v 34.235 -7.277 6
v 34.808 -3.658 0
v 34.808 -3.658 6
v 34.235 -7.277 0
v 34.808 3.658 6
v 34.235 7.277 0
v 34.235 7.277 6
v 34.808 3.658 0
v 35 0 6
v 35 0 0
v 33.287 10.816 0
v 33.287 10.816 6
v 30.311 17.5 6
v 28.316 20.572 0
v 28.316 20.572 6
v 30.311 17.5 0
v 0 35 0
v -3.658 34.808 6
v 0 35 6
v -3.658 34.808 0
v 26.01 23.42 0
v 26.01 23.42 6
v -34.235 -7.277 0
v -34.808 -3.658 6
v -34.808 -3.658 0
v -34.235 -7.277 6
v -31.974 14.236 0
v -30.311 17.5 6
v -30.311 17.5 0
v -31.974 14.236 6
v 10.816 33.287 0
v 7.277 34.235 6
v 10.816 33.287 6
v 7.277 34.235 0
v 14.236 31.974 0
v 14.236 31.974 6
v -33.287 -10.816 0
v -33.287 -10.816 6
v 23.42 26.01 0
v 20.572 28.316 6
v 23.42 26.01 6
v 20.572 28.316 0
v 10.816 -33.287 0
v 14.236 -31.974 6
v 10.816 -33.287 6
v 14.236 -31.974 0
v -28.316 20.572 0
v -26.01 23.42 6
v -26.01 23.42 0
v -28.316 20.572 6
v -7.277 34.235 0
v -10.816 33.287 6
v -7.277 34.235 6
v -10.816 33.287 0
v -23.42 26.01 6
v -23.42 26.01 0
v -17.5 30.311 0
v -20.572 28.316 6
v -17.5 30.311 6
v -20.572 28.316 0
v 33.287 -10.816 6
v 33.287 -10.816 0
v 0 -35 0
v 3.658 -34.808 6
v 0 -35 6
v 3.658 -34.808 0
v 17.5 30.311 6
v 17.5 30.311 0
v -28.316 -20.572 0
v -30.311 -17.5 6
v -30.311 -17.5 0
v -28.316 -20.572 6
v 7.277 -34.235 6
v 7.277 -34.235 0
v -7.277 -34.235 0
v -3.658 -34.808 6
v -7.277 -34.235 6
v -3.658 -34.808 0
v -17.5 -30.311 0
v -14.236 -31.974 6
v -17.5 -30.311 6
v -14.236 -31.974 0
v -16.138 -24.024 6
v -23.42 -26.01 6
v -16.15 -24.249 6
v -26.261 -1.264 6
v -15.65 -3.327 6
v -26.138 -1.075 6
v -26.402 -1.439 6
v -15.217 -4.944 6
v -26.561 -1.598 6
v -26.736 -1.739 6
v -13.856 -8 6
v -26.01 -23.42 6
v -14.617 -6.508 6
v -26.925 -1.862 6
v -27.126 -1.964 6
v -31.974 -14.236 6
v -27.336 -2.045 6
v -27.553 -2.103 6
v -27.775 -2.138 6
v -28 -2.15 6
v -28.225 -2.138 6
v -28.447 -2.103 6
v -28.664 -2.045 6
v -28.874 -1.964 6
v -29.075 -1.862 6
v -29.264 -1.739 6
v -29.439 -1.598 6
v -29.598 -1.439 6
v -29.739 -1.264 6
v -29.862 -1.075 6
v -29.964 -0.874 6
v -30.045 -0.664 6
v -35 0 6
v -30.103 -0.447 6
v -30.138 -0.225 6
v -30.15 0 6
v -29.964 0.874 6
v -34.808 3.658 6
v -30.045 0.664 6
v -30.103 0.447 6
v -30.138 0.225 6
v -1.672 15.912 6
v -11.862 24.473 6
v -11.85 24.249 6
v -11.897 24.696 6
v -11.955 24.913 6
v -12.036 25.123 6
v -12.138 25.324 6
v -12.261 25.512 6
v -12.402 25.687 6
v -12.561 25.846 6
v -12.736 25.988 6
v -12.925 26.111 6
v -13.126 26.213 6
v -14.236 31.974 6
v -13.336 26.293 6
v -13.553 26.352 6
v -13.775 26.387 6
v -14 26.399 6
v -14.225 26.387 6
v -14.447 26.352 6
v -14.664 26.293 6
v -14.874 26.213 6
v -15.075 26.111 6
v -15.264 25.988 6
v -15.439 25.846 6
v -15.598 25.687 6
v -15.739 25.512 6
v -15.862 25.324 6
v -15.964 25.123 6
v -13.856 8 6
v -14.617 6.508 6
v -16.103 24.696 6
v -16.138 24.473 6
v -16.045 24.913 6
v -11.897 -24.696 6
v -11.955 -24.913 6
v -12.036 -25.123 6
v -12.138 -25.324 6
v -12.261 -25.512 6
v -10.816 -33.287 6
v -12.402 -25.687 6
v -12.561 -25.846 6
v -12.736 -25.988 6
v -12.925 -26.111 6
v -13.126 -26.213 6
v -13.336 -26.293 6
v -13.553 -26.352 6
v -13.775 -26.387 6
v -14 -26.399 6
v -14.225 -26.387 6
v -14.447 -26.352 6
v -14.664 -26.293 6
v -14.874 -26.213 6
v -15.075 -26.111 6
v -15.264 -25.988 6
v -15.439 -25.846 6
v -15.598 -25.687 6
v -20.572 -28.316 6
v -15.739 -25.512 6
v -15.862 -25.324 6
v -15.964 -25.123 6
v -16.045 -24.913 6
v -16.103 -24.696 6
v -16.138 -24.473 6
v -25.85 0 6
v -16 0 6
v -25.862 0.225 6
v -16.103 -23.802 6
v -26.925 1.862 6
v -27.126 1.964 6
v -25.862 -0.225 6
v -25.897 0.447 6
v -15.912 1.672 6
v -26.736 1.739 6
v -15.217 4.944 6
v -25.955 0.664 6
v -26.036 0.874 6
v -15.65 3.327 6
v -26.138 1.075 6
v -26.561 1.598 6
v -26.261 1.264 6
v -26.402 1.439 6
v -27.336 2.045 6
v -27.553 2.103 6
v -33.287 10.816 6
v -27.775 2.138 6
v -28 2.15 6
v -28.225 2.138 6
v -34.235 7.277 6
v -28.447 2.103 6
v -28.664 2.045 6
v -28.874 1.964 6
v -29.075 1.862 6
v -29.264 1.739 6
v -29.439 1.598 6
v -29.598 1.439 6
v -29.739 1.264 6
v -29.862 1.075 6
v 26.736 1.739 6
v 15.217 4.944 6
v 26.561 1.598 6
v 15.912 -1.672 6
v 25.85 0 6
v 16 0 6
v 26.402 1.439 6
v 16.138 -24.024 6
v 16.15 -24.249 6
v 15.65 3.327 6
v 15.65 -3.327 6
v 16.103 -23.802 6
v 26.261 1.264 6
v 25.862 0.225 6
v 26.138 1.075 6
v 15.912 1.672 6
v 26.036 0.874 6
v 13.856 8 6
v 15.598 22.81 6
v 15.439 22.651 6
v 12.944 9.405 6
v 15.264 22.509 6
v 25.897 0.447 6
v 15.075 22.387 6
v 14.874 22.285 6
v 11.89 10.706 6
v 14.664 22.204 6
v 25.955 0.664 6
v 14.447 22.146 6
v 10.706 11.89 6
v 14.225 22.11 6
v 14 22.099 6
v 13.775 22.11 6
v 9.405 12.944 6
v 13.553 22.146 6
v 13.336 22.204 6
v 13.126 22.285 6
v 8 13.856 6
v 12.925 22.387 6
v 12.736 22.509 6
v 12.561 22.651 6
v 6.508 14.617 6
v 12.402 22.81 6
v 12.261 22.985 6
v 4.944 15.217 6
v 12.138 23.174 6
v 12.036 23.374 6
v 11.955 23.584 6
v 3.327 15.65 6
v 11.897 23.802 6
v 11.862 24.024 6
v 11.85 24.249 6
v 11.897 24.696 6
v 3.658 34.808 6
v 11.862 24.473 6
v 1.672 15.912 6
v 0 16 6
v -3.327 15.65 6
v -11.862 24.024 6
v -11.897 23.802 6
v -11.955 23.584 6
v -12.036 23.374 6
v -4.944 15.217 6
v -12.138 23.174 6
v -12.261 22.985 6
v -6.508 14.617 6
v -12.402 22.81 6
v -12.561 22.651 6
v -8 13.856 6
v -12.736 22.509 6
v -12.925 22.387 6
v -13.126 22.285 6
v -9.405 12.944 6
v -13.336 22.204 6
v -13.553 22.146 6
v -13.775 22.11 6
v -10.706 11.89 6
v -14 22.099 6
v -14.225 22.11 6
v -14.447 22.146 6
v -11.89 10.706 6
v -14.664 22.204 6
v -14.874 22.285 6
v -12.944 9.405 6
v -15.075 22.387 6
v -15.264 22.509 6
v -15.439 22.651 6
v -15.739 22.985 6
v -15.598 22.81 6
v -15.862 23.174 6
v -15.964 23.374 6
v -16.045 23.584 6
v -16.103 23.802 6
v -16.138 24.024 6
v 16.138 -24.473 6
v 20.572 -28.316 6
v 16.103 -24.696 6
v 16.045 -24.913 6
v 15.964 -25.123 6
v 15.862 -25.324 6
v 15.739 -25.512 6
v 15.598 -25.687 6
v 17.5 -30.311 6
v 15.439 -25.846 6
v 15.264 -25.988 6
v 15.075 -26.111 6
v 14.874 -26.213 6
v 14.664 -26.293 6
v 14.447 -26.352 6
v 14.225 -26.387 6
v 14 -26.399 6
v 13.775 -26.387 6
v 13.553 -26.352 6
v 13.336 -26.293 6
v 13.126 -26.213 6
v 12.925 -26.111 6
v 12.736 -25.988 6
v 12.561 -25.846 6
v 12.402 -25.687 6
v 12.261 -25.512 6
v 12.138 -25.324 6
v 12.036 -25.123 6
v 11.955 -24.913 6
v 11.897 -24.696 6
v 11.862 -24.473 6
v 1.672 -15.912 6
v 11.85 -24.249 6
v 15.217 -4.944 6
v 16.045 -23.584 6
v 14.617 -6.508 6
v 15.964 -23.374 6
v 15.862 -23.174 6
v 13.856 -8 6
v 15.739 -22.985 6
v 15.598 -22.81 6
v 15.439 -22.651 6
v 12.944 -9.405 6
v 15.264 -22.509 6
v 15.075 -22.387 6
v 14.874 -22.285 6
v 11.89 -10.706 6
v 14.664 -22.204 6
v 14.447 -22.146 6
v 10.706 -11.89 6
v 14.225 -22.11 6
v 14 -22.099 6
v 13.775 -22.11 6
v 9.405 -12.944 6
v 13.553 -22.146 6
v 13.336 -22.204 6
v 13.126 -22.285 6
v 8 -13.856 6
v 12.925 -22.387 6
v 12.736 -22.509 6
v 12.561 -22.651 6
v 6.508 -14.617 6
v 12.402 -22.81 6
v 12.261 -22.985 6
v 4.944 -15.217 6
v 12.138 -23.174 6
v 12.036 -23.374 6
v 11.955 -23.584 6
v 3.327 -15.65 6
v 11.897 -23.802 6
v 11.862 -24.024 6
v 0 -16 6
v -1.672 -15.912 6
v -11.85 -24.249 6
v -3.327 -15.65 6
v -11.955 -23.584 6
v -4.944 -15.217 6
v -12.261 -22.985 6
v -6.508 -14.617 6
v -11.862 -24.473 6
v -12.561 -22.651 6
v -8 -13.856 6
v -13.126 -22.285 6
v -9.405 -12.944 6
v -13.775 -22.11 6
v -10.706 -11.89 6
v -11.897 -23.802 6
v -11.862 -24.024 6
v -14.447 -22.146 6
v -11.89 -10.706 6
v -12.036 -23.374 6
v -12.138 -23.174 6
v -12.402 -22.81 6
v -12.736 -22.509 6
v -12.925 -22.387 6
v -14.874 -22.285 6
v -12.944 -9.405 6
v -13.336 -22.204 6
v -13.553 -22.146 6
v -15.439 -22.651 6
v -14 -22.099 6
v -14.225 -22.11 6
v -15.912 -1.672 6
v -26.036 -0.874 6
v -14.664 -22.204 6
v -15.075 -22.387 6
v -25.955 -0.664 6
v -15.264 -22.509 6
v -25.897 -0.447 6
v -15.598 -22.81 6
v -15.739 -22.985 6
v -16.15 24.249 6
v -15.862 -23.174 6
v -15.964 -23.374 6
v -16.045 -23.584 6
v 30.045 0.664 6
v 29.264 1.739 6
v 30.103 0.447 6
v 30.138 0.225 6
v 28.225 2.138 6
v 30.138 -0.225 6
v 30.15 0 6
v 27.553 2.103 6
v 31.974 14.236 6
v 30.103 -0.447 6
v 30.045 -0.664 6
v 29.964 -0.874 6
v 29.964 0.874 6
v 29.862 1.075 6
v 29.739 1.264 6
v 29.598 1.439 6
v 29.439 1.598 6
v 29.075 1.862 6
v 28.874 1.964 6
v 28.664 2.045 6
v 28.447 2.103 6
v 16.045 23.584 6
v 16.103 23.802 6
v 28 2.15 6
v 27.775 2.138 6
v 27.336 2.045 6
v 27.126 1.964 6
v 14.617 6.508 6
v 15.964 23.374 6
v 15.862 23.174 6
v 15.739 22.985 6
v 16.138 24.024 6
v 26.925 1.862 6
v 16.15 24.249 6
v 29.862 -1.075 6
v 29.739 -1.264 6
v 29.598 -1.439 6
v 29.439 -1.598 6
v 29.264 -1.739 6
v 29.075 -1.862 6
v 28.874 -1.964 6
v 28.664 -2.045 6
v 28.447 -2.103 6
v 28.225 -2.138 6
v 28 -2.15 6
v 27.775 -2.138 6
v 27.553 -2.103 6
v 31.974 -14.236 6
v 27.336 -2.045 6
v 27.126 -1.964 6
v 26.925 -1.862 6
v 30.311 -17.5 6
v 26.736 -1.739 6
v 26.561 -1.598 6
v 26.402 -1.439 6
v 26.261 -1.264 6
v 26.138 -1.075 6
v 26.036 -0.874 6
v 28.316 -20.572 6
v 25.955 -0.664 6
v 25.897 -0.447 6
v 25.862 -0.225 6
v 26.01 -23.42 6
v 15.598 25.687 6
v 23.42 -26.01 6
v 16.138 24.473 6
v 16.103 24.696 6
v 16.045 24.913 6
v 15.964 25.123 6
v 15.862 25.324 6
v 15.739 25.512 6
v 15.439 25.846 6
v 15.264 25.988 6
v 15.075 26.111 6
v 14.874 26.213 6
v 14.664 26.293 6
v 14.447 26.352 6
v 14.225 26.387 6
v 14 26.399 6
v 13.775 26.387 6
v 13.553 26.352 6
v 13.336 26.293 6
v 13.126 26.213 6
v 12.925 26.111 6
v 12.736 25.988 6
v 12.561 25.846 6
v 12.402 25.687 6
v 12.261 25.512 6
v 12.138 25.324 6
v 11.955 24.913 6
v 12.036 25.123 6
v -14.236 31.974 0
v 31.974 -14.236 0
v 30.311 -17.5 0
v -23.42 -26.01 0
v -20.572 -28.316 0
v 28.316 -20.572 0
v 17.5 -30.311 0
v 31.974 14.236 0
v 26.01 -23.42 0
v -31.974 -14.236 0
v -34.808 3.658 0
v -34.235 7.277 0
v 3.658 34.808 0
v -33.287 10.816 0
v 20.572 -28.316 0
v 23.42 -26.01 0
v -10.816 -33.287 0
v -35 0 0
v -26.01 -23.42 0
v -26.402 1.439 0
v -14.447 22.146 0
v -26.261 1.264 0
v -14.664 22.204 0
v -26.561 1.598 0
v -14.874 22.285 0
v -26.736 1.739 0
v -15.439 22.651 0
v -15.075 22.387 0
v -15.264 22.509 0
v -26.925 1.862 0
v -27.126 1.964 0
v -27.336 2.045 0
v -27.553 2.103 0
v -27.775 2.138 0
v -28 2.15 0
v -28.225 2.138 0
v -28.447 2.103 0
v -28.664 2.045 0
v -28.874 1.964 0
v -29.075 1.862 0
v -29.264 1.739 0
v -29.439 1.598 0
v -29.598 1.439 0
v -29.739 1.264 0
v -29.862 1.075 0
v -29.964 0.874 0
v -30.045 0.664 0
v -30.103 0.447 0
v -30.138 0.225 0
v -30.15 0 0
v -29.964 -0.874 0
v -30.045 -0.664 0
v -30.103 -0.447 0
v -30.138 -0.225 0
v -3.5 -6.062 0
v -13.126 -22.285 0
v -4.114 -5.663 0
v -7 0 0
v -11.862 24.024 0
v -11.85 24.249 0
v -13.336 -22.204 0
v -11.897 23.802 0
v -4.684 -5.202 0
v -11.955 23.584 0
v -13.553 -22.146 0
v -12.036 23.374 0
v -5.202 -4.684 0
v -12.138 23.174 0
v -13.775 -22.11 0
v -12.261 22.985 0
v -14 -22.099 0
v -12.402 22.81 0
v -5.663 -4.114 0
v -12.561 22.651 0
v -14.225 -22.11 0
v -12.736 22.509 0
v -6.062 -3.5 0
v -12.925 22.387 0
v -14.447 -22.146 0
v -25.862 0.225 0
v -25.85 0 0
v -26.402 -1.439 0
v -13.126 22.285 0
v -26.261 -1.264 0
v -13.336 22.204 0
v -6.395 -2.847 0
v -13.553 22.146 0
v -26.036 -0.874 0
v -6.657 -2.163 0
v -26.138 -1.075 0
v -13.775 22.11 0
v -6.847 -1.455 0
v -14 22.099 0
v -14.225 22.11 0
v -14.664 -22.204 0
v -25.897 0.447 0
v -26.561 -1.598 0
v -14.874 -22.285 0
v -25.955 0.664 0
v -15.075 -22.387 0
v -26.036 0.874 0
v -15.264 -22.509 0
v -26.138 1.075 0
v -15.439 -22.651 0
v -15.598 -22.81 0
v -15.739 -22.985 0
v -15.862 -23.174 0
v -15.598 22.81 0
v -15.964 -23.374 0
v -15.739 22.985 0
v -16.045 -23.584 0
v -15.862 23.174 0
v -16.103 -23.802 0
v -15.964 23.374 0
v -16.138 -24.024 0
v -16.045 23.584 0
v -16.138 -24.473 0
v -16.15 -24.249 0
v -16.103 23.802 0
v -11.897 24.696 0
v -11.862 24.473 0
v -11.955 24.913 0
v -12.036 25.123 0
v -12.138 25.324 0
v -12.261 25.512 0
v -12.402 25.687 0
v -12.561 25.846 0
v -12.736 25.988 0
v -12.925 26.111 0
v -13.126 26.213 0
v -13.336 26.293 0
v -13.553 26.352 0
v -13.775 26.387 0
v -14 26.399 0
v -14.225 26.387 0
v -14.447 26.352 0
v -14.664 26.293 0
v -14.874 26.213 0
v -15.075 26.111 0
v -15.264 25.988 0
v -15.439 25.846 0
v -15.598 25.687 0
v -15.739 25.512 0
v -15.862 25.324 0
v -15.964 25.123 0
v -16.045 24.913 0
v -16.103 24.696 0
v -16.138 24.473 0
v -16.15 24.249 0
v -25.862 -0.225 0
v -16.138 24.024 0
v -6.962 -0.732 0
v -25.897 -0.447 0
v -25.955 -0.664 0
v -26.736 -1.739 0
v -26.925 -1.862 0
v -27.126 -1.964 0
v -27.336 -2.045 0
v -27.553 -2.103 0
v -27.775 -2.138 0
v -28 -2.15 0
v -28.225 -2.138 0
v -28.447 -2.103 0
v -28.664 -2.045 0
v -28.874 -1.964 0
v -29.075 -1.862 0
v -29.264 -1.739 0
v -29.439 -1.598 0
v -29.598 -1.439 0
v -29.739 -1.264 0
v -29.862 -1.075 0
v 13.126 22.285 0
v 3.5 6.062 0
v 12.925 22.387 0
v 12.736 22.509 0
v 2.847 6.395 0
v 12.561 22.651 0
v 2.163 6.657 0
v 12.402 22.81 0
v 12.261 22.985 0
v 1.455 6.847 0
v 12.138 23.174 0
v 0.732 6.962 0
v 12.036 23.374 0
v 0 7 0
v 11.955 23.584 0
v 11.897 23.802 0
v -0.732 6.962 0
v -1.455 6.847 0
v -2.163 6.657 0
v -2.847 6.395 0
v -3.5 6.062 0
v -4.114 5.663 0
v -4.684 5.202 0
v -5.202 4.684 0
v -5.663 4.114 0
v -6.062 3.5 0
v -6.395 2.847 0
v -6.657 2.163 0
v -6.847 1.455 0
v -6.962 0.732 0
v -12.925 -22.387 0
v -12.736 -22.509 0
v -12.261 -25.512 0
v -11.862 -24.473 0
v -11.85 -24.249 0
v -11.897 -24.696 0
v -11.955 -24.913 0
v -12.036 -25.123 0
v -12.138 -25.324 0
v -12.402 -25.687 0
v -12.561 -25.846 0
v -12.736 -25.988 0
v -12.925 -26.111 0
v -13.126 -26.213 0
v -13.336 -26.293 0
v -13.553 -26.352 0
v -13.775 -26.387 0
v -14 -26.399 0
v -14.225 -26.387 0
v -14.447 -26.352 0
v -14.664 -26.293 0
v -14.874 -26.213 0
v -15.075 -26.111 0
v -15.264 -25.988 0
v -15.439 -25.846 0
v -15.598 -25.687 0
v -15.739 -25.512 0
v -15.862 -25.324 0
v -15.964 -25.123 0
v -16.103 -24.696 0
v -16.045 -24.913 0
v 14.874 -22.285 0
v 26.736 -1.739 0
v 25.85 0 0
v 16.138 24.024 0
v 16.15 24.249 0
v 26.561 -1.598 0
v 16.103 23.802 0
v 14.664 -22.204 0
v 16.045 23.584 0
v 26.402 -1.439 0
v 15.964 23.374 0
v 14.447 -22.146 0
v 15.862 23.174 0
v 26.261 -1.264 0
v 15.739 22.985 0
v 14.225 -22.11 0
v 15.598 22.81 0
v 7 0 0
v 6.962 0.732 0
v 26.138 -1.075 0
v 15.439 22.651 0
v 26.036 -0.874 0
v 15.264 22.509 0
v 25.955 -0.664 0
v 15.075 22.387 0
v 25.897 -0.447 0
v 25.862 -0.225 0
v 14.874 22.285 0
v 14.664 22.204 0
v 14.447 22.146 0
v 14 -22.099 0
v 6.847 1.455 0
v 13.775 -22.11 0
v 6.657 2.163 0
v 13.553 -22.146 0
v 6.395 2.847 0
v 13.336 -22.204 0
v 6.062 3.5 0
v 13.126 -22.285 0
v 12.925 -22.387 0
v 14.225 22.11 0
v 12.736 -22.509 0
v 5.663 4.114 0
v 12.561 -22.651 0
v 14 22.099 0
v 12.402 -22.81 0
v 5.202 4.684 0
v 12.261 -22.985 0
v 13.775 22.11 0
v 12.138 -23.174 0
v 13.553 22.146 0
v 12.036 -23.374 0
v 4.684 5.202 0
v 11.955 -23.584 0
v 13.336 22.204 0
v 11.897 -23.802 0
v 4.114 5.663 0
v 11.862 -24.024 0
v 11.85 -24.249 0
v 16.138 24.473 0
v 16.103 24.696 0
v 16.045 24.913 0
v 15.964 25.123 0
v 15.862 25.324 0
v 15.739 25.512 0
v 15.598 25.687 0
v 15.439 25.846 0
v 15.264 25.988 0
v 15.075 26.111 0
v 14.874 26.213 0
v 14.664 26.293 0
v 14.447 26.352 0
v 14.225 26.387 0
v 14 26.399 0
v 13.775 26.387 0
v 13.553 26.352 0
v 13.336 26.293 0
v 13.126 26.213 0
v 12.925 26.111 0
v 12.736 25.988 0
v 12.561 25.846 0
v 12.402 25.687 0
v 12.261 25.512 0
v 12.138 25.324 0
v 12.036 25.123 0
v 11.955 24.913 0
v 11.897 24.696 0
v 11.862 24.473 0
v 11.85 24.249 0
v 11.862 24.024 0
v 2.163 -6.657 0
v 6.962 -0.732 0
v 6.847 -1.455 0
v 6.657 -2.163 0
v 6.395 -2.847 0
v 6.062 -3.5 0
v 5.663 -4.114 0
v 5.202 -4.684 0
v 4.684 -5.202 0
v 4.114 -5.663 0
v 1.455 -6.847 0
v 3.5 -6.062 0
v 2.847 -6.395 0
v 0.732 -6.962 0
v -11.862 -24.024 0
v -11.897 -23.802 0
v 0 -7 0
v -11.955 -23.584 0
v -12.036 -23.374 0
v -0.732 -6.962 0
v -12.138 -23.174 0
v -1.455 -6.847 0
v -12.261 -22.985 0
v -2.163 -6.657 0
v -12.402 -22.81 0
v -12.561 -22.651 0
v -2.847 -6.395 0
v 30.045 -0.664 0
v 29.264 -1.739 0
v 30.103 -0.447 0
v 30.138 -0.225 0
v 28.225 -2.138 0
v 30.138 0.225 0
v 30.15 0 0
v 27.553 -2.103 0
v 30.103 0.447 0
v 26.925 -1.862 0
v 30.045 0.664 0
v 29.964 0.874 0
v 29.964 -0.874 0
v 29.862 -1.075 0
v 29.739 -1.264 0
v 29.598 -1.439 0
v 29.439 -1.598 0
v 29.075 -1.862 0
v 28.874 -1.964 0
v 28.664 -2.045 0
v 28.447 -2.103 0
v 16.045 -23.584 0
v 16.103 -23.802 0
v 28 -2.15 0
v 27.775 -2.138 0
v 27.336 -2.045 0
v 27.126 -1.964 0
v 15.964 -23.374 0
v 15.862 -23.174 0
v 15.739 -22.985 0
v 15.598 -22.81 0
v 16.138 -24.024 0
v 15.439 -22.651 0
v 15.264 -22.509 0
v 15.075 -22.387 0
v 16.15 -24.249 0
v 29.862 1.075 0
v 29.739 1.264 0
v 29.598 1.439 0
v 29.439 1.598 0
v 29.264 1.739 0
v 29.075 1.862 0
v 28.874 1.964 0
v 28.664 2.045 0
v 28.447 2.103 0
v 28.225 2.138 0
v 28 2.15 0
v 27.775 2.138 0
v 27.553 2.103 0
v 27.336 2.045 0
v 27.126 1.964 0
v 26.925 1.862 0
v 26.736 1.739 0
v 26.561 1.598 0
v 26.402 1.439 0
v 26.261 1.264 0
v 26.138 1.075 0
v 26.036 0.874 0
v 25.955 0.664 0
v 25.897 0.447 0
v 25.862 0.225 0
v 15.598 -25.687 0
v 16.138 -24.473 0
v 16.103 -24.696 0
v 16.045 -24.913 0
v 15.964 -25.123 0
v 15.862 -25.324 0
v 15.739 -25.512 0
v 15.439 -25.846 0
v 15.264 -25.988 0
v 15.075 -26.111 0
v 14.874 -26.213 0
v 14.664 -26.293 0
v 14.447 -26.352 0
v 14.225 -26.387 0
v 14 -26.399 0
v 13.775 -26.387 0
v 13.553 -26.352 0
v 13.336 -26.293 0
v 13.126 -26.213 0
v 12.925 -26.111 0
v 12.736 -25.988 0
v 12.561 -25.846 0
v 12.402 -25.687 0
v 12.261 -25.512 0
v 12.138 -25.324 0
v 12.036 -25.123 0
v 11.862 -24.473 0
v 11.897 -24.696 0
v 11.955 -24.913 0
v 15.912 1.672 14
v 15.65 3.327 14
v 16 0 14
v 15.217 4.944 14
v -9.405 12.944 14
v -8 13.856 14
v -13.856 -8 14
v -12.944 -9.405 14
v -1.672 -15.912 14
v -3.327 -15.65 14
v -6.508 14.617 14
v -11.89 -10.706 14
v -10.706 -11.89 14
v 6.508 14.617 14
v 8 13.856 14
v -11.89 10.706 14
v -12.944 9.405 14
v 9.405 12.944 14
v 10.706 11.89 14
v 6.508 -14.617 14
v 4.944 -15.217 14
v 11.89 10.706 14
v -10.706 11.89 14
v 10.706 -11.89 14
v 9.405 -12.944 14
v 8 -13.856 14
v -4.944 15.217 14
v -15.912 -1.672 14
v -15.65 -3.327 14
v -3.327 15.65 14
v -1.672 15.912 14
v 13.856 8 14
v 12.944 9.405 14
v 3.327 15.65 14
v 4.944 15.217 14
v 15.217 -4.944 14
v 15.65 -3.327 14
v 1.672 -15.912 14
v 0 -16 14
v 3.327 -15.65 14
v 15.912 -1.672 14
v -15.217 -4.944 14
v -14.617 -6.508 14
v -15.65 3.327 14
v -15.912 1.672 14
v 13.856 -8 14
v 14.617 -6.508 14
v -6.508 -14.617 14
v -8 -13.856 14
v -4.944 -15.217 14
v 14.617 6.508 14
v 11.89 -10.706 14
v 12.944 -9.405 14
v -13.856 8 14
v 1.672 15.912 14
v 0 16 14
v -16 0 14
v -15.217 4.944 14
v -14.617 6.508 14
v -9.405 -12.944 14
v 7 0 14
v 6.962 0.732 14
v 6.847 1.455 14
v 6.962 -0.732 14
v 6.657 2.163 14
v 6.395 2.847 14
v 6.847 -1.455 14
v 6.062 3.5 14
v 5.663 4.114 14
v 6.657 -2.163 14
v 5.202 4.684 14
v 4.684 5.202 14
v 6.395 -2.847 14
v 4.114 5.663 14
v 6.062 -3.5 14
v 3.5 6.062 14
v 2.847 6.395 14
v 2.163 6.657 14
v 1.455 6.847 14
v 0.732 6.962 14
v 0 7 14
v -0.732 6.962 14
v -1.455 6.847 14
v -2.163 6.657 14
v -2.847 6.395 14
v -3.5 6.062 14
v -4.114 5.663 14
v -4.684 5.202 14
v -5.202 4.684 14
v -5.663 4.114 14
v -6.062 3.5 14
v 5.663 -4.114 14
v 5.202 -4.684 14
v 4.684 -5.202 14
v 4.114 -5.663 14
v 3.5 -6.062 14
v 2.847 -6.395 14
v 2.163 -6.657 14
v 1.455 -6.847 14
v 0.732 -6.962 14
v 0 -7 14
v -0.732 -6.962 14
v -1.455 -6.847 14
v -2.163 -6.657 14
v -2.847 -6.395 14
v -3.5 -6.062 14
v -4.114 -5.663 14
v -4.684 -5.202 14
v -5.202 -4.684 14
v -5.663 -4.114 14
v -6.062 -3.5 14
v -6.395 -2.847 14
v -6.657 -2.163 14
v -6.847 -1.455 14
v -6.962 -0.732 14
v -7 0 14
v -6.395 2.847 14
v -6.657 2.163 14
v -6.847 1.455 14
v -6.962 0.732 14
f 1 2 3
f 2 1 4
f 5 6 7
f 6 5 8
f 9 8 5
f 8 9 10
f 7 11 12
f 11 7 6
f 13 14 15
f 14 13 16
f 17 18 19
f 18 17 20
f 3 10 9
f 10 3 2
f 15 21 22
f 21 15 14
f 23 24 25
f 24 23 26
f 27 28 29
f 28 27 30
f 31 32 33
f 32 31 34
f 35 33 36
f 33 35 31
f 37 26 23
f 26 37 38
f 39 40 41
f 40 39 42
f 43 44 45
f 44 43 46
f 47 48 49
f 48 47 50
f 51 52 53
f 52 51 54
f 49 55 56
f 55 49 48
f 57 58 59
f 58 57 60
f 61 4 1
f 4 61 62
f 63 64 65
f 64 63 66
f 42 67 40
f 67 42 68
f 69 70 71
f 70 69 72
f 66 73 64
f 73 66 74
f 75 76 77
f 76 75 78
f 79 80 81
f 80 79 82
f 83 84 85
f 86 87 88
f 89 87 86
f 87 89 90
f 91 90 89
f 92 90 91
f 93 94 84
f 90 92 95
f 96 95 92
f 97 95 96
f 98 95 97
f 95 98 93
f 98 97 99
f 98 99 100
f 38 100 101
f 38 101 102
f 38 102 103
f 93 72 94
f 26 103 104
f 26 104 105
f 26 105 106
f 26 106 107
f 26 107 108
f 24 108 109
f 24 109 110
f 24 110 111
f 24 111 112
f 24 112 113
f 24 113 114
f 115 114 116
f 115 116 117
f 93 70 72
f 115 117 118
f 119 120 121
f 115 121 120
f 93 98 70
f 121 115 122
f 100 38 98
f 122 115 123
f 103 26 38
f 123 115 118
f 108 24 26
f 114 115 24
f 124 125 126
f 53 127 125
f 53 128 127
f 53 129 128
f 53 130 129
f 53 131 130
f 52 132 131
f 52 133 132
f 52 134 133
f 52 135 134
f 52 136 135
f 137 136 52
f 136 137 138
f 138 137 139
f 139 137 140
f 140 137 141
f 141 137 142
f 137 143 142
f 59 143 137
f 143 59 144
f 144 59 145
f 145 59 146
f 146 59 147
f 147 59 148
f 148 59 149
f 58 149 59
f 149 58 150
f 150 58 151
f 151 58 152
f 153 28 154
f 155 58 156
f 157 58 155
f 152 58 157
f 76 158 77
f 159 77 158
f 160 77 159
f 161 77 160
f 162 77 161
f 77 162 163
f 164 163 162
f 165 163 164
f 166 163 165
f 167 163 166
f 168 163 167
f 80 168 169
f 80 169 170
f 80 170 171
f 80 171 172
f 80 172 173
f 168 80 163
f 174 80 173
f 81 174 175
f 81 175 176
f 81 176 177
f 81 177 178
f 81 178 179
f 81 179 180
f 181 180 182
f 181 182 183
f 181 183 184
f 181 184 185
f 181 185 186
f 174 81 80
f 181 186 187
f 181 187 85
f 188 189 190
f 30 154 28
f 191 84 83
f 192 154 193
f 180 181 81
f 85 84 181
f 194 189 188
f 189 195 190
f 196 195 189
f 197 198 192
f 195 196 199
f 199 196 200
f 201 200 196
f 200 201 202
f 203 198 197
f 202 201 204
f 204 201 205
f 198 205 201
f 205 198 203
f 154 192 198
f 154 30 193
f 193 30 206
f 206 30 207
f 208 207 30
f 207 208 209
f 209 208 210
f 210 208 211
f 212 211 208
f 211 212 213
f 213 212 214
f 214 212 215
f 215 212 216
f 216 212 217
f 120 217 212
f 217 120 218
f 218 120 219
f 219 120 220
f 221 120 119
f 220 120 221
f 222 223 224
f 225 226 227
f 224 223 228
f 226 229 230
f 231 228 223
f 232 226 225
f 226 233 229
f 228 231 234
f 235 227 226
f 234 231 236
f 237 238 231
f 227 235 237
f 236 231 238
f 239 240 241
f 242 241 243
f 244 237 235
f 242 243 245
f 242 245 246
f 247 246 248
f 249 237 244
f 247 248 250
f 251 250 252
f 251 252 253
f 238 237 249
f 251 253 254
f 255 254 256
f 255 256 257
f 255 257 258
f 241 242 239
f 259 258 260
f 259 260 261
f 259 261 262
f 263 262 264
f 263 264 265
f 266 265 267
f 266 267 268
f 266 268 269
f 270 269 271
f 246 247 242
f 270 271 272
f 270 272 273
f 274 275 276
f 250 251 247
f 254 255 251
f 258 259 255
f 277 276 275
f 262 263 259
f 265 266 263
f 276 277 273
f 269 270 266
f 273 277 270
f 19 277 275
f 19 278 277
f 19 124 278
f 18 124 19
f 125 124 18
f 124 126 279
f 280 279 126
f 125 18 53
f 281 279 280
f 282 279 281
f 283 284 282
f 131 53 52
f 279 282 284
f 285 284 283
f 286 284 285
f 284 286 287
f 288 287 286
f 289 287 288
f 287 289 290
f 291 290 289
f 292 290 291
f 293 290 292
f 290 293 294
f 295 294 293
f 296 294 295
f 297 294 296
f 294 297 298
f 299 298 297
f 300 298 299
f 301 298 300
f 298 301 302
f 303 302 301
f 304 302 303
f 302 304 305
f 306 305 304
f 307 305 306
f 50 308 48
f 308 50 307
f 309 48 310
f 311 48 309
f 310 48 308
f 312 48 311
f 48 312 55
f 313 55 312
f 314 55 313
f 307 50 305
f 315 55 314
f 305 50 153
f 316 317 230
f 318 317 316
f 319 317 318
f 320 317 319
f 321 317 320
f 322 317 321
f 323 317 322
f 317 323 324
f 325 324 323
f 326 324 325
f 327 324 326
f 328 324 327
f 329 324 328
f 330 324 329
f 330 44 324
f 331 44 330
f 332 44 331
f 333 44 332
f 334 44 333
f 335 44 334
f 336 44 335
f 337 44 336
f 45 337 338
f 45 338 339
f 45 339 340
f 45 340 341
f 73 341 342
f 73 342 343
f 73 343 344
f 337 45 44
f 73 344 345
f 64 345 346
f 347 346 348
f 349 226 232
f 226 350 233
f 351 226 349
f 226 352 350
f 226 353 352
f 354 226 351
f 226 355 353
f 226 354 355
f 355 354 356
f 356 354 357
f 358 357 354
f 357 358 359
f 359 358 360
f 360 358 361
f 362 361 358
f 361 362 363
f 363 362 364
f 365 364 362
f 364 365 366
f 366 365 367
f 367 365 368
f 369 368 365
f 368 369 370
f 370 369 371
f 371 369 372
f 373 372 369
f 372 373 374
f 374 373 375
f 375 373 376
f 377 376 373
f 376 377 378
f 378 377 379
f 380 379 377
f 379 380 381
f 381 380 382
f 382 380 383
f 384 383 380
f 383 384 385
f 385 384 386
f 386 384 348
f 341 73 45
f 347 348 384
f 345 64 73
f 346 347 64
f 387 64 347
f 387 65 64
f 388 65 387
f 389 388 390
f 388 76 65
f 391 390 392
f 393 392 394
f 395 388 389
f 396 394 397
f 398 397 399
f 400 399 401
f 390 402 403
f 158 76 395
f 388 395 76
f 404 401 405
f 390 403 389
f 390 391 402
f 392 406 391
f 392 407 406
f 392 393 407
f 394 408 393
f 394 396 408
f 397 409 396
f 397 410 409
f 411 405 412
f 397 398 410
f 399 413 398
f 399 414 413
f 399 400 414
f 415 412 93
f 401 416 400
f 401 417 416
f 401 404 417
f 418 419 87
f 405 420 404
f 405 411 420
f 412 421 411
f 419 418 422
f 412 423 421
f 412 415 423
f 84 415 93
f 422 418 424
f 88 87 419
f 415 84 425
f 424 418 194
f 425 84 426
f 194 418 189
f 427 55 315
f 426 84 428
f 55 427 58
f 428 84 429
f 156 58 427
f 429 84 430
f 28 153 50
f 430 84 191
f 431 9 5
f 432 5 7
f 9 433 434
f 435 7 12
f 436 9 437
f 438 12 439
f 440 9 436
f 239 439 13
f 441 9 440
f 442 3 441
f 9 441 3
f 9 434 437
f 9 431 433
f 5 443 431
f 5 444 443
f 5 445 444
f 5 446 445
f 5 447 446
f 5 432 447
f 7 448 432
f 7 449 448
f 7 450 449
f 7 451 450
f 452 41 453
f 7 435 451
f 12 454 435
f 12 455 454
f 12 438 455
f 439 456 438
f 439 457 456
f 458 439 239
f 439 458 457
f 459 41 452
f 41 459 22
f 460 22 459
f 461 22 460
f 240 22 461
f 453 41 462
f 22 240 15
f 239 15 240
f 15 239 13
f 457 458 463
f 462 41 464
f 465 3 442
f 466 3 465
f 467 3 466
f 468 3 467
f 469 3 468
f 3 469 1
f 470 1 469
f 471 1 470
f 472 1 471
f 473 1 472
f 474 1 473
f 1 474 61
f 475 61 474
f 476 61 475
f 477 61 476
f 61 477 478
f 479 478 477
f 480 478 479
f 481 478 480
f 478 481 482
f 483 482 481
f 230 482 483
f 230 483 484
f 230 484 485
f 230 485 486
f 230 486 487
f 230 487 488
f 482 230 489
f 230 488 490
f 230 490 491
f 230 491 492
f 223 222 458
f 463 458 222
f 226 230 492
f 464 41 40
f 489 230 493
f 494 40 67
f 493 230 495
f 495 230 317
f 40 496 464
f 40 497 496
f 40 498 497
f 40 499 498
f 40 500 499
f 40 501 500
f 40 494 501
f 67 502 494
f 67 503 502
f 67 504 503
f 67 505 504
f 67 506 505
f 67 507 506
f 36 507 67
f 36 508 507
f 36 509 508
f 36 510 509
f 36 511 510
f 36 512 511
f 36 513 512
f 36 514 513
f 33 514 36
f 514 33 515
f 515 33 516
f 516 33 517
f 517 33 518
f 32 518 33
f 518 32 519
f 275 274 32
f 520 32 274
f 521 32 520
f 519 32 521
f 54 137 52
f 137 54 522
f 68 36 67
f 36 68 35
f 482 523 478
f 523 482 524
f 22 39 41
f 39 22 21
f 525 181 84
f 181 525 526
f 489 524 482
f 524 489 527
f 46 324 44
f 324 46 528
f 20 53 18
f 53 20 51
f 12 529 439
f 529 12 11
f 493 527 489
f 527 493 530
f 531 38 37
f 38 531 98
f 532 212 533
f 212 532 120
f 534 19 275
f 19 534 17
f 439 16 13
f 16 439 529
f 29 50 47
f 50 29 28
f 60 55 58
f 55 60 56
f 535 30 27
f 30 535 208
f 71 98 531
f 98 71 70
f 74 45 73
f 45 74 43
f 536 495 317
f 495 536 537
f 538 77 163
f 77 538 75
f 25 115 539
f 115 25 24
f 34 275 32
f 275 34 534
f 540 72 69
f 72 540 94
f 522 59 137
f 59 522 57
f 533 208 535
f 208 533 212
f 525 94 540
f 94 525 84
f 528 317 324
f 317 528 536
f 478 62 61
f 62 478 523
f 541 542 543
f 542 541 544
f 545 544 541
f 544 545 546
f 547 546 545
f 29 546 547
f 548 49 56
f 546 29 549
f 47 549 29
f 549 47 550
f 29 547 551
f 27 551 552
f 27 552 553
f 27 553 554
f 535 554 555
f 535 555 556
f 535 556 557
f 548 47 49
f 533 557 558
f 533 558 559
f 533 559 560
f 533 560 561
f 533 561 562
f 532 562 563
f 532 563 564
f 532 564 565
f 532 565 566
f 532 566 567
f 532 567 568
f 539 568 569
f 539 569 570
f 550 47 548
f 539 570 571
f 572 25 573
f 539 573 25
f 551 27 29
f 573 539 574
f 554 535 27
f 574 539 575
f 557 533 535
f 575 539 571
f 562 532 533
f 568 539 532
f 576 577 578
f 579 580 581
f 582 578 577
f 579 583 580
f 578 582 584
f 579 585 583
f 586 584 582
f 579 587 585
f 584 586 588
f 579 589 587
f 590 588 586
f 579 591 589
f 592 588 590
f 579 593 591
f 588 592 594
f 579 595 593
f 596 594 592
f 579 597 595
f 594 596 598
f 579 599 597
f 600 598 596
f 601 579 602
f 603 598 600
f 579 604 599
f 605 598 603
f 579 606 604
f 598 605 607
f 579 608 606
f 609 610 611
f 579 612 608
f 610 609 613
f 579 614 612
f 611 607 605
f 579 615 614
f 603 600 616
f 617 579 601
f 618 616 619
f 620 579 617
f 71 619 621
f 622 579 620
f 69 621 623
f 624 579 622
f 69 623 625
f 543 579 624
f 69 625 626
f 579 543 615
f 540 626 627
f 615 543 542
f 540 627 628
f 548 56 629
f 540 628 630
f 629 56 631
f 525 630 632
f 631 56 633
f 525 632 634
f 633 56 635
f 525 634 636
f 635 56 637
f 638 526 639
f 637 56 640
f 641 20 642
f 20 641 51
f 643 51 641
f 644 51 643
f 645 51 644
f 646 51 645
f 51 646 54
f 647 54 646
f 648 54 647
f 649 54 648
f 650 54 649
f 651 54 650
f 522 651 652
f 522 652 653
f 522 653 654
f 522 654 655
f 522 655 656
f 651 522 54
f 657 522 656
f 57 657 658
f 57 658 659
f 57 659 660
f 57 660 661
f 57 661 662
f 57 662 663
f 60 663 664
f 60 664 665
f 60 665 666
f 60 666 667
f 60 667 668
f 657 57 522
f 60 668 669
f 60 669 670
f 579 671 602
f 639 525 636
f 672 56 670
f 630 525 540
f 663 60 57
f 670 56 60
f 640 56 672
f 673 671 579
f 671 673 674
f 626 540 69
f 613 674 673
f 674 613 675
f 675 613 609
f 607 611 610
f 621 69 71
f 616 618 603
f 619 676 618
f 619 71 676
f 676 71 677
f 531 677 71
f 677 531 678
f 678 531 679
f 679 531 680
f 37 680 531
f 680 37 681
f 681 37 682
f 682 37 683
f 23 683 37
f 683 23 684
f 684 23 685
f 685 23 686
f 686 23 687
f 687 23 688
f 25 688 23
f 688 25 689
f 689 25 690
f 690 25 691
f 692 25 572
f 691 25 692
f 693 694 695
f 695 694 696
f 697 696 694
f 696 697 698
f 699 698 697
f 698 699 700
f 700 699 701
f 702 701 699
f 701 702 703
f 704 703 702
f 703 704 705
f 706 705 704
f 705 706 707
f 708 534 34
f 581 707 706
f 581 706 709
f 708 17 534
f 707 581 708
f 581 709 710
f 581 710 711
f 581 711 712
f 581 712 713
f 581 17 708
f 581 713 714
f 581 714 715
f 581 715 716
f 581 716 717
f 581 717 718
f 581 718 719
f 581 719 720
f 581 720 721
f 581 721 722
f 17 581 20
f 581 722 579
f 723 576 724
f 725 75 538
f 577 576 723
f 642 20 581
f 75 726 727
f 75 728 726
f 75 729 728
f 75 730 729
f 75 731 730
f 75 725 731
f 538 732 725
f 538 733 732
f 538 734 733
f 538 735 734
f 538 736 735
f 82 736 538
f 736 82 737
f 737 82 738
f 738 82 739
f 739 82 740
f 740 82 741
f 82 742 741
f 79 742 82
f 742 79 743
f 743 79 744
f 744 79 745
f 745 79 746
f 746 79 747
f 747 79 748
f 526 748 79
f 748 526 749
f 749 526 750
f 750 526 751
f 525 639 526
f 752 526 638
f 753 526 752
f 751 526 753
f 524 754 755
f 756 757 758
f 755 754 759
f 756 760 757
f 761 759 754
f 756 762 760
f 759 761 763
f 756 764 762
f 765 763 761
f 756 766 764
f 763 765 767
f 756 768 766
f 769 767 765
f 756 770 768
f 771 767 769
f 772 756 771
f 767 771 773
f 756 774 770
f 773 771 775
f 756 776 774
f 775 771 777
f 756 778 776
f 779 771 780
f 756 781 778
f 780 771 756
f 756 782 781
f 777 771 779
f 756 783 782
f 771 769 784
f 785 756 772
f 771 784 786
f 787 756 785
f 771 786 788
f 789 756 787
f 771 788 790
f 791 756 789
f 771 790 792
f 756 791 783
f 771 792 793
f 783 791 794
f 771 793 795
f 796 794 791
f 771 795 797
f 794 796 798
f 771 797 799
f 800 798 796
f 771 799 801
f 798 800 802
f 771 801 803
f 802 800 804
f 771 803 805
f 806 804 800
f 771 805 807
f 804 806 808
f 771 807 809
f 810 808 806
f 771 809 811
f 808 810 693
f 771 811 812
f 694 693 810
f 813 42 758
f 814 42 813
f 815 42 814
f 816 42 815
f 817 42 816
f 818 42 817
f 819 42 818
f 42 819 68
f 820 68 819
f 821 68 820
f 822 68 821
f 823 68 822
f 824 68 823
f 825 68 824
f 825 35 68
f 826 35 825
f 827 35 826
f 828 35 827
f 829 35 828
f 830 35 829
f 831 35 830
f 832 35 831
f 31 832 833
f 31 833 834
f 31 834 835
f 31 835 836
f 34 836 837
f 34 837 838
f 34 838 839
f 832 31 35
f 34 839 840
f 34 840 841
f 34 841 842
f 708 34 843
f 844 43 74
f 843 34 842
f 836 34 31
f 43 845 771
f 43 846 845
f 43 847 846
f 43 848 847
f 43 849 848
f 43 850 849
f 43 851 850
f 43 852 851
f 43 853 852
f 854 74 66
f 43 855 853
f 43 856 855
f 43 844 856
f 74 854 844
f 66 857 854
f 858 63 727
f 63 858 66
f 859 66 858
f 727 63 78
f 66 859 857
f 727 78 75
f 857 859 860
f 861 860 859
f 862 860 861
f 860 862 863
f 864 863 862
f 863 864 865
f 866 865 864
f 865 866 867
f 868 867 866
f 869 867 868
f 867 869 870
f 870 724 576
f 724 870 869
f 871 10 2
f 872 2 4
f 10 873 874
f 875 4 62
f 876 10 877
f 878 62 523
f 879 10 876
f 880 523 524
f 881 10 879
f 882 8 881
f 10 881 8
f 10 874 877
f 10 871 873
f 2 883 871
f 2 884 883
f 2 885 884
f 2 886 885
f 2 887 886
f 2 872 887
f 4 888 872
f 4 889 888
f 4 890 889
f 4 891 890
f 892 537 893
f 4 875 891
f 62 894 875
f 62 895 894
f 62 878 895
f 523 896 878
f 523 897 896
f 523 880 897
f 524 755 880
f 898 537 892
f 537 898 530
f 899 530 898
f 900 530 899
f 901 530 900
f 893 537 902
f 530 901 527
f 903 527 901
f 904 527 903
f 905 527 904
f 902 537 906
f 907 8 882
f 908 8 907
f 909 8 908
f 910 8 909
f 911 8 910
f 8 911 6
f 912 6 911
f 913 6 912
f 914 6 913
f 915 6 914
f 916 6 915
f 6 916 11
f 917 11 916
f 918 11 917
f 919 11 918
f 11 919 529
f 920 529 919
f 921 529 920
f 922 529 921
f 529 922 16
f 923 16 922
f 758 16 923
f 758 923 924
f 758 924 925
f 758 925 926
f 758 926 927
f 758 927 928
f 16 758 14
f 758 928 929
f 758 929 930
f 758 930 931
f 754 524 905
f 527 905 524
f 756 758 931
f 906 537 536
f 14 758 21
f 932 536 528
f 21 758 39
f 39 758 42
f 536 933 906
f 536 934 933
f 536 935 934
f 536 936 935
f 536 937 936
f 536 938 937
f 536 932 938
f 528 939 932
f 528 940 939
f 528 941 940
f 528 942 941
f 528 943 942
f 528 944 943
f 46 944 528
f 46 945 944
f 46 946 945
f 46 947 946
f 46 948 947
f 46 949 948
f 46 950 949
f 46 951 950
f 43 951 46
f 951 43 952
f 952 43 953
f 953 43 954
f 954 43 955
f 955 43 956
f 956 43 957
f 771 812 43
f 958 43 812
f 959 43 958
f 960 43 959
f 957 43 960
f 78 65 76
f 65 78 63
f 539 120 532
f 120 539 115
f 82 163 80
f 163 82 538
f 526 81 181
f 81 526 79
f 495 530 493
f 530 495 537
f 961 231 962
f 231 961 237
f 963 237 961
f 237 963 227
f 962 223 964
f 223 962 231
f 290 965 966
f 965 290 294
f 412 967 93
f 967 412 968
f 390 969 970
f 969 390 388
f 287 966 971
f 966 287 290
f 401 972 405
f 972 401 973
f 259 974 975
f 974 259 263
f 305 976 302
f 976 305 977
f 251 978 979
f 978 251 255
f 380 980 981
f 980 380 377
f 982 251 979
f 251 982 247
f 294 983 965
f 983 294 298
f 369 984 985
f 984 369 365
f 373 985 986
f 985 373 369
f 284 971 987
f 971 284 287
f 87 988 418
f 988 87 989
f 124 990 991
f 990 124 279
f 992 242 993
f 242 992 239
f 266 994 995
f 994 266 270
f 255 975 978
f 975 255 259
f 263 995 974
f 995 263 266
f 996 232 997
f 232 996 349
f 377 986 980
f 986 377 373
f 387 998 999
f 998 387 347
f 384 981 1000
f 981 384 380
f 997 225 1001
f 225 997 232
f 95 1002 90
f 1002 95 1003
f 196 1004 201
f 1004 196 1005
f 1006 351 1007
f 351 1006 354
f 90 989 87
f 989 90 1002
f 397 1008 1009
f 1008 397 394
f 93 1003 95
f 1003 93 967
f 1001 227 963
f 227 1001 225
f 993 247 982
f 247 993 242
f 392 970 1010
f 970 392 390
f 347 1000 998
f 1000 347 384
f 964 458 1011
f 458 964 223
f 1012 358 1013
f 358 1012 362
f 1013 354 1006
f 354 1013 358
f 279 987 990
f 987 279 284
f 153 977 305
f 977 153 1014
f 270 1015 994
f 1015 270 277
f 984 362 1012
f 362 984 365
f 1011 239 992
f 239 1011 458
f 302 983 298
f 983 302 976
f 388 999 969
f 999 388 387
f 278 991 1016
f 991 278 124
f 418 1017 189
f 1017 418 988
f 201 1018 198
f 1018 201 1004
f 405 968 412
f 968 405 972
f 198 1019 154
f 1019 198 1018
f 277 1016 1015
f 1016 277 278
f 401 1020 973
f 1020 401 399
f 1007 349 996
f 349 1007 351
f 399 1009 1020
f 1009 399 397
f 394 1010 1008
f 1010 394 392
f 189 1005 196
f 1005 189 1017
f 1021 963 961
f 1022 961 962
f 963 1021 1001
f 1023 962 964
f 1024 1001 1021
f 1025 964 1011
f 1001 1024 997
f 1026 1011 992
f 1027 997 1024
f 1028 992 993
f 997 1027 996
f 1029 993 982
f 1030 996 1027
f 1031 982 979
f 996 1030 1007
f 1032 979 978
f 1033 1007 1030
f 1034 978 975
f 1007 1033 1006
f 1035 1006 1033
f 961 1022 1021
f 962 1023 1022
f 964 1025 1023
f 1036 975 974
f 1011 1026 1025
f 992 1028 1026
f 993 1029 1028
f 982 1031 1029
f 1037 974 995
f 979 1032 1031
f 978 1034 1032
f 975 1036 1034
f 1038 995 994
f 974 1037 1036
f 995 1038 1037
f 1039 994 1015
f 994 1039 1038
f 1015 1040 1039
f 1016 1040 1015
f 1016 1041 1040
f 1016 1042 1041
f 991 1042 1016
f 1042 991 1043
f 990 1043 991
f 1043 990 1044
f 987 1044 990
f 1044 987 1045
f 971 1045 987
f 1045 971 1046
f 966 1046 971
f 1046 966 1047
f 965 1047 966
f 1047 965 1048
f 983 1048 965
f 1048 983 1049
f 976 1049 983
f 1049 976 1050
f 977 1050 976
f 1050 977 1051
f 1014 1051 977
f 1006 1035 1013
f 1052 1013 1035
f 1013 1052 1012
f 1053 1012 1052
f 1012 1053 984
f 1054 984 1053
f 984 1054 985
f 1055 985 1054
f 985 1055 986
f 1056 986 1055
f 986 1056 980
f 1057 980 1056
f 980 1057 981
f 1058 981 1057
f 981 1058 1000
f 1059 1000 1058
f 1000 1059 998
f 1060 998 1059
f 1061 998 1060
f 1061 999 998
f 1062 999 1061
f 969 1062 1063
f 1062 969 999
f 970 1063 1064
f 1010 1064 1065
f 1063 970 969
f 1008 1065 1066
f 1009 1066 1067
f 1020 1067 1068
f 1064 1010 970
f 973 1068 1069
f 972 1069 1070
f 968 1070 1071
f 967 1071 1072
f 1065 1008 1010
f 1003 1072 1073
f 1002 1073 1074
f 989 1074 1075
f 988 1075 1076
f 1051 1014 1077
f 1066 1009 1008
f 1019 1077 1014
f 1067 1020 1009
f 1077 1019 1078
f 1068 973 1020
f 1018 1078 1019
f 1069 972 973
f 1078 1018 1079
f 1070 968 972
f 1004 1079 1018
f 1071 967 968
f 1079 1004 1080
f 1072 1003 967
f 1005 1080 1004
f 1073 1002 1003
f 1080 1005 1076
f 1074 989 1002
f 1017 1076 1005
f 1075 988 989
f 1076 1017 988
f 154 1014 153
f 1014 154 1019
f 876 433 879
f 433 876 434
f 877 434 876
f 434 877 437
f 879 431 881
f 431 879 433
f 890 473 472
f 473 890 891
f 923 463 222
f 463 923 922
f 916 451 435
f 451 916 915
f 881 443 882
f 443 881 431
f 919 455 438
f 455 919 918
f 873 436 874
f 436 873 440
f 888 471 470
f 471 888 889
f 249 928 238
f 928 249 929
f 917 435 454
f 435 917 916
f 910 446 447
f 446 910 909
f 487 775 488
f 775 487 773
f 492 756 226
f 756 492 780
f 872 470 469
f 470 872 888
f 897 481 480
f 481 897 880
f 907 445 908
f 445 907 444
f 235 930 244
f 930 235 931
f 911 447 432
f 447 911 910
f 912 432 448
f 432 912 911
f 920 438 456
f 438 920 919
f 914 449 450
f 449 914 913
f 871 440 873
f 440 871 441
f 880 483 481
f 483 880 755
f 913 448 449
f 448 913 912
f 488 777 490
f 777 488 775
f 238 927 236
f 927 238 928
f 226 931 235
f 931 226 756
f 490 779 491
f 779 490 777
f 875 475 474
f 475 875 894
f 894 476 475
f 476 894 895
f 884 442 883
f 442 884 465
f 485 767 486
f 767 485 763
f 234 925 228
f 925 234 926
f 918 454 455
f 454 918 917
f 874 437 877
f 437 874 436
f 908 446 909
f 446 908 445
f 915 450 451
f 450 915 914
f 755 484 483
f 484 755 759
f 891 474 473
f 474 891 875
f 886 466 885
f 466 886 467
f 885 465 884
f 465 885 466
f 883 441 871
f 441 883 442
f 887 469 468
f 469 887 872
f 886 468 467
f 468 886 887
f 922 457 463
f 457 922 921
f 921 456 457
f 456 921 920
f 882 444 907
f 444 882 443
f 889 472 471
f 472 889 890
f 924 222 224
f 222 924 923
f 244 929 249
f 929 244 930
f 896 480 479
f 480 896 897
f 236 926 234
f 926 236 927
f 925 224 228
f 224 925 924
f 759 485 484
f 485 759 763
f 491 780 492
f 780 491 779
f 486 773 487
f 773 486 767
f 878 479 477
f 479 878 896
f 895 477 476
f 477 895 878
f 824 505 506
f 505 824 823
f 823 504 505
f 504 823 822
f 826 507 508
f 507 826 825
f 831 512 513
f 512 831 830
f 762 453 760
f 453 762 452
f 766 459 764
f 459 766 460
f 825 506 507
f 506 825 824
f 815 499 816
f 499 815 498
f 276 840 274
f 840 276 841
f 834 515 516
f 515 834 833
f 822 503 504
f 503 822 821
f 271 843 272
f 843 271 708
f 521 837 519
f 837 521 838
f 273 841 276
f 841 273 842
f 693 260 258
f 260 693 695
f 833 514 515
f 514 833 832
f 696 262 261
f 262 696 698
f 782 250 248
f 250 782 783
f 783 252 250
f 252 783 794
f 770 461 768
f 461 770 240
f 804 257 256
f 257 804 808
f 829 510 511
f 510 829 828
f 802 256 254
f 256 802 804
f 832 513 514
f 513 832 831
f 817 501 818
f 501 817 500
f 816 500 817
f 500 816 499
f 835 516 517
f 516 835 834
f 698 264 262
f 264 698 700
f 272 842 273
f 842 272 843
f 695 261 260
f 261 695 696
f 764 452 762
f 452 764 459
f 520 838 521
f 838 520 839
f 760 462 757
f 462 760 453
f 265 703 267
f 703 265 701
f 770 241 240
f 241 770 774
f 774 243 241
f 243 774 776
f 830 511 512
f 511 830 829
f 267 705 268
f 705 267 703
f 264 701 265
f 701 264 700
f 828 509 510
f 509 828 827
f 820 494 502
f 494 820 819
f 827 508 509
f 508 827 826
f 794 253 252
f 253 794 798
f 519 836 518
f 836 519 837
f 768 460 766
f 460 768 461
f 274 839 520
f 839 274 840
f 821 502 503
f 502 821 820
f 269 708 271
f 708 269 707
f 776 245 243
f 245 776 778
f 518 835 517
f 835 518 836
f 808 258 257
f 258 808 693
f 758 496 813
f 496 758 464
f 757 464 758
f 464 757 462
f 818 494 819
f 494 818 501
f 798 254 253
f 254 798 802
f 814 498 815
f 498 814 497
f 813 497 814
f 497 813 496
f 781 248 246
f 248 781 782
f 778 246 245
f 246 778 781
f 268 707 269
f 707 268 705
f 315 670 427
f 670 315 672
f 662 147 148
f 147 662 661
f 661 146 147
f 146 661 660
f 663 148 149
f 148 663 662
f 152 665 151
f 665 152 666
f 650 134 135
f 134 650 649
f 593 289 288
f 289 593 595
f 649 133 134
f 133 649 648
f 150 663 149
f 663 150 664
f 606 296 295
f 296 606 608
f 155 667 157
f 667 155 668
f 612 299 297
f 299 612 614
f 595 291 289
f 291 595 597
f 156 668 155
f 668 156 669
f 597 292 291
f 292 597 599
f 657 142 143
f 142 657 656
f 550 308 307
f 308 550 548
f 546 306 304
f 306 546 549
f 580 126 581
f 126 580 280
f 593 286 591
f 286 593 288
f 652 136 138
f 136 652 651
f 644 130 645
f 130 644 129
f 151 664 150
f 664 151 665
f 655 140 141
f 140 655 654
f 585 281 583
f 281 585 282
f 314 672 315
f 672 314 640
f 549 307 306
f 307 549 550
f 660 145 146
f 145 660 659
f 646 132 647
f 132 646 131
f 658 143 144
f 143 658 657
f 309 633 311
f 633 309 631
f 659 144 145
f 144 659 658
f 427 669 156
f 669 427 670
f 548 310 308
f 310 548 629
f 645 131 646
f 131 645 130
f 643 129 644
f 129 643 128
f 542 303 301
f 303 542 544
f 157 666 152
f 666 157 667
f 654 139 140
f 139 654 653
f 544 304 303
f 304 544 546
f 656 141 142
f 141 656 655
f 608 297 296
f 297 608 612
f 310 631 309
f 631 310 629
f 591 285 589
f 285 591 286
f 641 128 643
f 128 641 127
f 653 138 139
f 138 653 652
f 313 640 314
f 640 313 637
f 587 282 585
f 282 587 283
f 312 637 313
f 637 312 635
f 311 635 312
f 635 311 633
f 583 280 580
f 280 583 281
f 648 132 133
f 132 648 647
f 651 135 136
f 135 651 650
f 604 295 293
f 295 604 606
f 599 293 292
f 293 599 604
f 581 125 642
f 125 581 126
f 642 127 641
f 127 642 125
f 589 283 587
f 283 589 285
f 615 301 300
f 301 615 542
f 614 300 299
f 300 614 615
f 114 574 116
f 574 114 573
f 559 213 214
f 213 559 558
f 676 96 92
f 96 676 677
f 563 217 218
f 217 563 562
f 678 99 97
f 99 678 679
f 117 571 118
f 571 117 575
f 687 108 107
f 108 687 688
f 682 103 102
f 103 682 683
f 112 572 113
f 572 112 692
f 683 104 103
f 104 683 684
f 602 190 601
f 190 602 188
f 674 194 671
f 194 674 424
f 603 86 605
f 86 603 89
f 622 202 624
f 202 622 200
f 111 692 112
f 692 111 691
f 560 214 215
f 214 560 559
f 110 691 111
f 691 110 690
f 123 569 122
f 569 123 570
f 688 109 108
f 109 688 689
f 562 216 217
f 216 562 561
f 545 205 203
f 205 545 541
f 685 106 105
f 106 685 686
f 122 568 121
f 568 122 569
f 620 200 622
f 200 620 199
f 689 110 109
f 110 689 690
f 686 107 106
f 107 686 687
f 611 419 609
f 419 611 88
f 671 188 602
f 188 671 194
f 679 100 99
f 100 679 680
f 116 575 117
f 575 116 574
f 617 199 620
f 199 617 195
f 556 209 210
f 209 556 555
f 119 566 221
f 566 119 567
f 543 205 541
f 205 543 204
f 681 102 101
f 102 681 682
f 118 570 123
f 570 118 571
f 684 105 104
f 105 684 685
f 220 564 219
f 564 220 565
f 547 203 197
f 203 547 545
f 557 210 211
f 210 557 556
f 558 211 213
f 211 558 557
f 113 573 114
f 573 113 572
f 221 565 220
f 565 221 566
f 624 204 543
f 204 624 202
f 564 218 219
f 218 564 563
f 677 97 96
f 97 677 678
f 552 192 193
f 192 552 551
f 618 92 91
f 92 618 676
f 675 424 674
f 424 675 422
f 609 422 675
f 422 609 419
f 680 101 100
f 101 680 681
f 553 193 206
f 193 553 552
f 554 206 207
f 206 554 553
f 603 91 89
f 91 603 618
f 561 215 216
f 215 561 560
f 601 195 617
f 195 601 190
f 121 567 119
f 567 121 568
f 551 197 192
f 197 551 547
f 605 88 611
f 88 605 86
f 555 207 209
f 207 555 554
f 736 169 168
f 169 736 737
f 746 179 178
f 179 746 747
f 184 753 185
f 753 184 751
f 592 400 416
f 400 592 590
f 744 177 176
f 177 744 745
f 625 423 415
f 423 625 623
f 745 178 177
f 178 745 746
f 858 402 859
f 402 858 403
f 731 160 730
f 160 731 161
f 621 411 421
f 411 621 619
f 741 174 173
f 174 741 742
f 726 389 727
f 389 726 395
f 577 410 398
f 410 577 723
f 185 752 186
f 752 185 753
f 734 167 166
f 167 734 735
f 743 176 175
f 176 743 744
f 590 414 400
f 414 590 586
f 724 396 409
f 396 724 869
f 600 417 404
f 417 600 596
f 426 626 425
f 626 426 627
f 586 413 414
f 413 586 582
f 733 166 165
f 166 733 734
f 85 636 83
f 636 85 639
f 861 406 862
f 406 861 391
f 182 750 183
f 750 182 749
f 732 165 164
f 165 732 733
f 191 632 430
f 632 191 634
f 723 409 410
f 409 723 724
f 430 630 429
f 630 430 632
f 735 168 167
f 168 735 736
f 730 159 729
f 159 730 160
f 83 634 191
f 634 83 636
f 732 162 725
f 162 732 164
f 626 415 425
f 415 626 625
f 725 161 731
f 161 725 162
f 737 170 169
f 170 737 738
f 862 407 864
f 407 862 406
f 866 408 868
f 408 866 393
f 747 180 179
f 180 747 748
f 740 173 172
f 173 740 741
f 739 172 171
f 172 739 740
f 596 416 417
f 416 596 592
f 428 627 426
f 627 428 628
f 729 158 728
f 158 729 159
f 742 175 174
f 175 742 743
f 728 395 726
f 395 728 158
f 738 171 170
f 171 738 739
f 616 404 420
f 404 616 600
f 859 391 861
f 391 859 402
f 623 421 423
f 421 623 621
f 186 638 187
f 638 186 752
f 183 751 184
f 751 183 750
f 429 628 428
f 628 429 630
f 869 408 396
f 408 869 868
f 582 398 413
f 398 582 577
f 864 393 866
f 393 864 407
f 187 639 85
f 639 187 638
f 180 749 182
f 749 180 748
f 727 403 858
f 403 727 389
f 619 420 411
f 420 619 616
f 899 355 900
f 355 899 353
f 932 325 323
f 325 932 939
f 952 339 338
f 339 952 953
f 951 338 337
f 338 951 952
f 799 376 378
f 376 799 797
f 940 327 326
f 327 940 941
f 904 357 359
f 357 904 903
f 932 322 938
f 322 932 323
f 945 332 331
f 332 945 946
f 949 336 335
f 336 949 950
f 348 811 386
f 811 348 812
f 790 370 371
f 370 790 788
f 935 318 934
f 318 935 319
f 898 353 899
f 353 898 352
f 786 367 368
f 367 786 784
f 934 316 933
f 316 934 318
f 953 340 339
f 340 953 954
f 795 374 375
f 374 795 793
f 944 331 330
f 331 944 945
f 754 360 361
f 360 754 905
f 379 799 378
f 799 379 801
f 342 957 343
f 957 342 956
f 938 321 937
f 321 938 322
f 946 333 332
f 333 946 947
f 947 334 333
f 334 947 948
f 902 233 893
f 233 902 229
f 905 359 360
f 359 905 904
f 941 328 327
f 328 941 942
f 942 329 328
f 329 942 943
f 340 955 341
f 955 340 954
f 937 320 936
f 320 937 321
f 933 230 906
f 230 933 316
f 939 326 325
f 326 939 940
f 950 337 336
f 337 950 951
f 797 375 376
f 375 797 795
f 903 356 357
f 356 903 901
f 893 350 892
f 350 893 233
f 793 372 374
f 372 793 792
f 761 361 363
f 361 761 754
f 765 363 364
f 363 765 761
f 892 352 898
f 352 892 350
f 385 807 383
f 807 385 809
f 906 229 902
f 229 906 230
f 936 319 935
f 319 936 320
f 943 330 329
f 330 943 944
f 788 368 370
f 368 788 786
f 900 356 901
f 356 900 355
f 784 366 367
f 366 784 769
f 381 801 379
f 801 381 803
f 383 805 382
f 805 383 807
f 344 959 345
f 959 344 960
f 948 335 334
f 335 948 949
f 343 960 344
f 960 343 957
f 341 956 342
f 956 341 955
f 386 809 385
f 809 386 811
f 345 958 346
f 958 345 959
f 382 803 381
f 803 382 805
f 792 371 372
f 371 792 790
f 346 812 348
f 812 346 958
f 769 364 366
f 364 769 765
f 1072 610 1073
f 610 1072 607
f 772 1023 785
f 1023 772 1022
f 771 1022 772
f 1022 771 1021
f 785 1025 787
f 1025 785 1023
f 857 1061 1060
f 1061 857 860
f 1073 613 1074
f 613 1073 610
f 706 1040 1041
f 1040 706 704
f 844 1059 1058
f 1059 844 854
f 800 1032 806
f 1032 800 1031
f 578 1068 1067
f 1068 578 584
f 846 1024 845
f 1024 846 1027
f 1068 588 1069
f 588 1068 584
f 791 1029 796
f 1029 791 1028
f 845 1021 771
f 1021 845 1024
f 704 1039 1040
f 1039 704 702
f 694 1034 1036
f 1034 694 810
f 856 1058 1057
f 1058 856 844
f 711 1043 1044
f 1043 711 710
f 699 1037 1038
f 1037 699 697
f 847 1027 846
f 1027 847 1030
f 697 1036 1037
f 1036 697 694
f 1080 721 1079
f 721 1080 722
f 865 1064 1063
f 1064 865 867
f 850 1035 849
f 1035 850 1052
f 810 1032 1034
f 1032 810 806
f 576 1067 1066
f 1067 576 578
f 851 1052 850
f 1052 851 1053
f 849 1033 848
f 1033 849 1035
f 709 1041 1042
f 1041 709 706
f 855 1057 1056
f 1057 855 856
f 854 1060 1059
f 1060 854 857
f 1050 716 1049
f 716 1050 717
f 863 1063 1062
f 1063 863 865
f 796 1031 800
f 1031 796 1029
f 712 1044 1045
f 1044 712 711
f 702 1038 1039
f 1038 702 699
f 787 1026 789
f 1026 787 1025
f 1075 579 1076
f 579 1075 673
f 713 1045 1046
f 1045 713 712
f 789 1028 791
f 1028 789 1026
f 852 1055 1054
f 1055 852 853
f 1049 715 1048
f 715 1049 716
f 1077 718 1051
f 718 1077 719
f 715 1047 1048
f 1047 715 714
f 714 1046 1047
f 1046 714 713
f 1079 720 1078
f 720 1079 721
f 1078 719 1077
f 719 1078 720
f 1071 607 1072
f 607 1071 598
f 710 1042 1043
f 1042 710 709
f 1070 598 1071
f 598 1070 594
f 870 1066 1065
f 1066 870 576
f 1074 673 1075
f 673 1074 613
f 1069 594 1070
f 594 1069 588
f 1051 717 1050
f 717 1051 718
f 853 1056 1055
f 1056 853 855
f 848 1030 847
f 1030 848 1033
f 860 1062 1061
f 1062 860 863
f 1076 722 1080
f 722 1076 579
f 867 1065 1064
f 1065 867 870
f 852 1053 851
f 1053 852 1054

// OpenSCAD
// 6-bolt mounting flange, 70 mm OD.
$fn = 60;
eps = 0.02;
flange_d = 70;
flange_t = 6;
hub_d = 32;
hub_h = 14;
center_d = 14;
bolt_circle_d = 56;
bolt_d = 4.3;
difference() {
    union() { cylinder(d = flange_d, h = flange_t); cylinder(d = hub_d, h = hub_h); }
    translate([0, 0, -eps]) cylinder(d = center_d, h = hub_h + 2 * eps);
    for (i = [0 : 5]) rotate([0, 0, i * 360 / 6])
        translate([bolt_circle_d / 2, 0, -eps]) cylinder(d = bolt_d, h = flange_t + 2 * eps);
}
